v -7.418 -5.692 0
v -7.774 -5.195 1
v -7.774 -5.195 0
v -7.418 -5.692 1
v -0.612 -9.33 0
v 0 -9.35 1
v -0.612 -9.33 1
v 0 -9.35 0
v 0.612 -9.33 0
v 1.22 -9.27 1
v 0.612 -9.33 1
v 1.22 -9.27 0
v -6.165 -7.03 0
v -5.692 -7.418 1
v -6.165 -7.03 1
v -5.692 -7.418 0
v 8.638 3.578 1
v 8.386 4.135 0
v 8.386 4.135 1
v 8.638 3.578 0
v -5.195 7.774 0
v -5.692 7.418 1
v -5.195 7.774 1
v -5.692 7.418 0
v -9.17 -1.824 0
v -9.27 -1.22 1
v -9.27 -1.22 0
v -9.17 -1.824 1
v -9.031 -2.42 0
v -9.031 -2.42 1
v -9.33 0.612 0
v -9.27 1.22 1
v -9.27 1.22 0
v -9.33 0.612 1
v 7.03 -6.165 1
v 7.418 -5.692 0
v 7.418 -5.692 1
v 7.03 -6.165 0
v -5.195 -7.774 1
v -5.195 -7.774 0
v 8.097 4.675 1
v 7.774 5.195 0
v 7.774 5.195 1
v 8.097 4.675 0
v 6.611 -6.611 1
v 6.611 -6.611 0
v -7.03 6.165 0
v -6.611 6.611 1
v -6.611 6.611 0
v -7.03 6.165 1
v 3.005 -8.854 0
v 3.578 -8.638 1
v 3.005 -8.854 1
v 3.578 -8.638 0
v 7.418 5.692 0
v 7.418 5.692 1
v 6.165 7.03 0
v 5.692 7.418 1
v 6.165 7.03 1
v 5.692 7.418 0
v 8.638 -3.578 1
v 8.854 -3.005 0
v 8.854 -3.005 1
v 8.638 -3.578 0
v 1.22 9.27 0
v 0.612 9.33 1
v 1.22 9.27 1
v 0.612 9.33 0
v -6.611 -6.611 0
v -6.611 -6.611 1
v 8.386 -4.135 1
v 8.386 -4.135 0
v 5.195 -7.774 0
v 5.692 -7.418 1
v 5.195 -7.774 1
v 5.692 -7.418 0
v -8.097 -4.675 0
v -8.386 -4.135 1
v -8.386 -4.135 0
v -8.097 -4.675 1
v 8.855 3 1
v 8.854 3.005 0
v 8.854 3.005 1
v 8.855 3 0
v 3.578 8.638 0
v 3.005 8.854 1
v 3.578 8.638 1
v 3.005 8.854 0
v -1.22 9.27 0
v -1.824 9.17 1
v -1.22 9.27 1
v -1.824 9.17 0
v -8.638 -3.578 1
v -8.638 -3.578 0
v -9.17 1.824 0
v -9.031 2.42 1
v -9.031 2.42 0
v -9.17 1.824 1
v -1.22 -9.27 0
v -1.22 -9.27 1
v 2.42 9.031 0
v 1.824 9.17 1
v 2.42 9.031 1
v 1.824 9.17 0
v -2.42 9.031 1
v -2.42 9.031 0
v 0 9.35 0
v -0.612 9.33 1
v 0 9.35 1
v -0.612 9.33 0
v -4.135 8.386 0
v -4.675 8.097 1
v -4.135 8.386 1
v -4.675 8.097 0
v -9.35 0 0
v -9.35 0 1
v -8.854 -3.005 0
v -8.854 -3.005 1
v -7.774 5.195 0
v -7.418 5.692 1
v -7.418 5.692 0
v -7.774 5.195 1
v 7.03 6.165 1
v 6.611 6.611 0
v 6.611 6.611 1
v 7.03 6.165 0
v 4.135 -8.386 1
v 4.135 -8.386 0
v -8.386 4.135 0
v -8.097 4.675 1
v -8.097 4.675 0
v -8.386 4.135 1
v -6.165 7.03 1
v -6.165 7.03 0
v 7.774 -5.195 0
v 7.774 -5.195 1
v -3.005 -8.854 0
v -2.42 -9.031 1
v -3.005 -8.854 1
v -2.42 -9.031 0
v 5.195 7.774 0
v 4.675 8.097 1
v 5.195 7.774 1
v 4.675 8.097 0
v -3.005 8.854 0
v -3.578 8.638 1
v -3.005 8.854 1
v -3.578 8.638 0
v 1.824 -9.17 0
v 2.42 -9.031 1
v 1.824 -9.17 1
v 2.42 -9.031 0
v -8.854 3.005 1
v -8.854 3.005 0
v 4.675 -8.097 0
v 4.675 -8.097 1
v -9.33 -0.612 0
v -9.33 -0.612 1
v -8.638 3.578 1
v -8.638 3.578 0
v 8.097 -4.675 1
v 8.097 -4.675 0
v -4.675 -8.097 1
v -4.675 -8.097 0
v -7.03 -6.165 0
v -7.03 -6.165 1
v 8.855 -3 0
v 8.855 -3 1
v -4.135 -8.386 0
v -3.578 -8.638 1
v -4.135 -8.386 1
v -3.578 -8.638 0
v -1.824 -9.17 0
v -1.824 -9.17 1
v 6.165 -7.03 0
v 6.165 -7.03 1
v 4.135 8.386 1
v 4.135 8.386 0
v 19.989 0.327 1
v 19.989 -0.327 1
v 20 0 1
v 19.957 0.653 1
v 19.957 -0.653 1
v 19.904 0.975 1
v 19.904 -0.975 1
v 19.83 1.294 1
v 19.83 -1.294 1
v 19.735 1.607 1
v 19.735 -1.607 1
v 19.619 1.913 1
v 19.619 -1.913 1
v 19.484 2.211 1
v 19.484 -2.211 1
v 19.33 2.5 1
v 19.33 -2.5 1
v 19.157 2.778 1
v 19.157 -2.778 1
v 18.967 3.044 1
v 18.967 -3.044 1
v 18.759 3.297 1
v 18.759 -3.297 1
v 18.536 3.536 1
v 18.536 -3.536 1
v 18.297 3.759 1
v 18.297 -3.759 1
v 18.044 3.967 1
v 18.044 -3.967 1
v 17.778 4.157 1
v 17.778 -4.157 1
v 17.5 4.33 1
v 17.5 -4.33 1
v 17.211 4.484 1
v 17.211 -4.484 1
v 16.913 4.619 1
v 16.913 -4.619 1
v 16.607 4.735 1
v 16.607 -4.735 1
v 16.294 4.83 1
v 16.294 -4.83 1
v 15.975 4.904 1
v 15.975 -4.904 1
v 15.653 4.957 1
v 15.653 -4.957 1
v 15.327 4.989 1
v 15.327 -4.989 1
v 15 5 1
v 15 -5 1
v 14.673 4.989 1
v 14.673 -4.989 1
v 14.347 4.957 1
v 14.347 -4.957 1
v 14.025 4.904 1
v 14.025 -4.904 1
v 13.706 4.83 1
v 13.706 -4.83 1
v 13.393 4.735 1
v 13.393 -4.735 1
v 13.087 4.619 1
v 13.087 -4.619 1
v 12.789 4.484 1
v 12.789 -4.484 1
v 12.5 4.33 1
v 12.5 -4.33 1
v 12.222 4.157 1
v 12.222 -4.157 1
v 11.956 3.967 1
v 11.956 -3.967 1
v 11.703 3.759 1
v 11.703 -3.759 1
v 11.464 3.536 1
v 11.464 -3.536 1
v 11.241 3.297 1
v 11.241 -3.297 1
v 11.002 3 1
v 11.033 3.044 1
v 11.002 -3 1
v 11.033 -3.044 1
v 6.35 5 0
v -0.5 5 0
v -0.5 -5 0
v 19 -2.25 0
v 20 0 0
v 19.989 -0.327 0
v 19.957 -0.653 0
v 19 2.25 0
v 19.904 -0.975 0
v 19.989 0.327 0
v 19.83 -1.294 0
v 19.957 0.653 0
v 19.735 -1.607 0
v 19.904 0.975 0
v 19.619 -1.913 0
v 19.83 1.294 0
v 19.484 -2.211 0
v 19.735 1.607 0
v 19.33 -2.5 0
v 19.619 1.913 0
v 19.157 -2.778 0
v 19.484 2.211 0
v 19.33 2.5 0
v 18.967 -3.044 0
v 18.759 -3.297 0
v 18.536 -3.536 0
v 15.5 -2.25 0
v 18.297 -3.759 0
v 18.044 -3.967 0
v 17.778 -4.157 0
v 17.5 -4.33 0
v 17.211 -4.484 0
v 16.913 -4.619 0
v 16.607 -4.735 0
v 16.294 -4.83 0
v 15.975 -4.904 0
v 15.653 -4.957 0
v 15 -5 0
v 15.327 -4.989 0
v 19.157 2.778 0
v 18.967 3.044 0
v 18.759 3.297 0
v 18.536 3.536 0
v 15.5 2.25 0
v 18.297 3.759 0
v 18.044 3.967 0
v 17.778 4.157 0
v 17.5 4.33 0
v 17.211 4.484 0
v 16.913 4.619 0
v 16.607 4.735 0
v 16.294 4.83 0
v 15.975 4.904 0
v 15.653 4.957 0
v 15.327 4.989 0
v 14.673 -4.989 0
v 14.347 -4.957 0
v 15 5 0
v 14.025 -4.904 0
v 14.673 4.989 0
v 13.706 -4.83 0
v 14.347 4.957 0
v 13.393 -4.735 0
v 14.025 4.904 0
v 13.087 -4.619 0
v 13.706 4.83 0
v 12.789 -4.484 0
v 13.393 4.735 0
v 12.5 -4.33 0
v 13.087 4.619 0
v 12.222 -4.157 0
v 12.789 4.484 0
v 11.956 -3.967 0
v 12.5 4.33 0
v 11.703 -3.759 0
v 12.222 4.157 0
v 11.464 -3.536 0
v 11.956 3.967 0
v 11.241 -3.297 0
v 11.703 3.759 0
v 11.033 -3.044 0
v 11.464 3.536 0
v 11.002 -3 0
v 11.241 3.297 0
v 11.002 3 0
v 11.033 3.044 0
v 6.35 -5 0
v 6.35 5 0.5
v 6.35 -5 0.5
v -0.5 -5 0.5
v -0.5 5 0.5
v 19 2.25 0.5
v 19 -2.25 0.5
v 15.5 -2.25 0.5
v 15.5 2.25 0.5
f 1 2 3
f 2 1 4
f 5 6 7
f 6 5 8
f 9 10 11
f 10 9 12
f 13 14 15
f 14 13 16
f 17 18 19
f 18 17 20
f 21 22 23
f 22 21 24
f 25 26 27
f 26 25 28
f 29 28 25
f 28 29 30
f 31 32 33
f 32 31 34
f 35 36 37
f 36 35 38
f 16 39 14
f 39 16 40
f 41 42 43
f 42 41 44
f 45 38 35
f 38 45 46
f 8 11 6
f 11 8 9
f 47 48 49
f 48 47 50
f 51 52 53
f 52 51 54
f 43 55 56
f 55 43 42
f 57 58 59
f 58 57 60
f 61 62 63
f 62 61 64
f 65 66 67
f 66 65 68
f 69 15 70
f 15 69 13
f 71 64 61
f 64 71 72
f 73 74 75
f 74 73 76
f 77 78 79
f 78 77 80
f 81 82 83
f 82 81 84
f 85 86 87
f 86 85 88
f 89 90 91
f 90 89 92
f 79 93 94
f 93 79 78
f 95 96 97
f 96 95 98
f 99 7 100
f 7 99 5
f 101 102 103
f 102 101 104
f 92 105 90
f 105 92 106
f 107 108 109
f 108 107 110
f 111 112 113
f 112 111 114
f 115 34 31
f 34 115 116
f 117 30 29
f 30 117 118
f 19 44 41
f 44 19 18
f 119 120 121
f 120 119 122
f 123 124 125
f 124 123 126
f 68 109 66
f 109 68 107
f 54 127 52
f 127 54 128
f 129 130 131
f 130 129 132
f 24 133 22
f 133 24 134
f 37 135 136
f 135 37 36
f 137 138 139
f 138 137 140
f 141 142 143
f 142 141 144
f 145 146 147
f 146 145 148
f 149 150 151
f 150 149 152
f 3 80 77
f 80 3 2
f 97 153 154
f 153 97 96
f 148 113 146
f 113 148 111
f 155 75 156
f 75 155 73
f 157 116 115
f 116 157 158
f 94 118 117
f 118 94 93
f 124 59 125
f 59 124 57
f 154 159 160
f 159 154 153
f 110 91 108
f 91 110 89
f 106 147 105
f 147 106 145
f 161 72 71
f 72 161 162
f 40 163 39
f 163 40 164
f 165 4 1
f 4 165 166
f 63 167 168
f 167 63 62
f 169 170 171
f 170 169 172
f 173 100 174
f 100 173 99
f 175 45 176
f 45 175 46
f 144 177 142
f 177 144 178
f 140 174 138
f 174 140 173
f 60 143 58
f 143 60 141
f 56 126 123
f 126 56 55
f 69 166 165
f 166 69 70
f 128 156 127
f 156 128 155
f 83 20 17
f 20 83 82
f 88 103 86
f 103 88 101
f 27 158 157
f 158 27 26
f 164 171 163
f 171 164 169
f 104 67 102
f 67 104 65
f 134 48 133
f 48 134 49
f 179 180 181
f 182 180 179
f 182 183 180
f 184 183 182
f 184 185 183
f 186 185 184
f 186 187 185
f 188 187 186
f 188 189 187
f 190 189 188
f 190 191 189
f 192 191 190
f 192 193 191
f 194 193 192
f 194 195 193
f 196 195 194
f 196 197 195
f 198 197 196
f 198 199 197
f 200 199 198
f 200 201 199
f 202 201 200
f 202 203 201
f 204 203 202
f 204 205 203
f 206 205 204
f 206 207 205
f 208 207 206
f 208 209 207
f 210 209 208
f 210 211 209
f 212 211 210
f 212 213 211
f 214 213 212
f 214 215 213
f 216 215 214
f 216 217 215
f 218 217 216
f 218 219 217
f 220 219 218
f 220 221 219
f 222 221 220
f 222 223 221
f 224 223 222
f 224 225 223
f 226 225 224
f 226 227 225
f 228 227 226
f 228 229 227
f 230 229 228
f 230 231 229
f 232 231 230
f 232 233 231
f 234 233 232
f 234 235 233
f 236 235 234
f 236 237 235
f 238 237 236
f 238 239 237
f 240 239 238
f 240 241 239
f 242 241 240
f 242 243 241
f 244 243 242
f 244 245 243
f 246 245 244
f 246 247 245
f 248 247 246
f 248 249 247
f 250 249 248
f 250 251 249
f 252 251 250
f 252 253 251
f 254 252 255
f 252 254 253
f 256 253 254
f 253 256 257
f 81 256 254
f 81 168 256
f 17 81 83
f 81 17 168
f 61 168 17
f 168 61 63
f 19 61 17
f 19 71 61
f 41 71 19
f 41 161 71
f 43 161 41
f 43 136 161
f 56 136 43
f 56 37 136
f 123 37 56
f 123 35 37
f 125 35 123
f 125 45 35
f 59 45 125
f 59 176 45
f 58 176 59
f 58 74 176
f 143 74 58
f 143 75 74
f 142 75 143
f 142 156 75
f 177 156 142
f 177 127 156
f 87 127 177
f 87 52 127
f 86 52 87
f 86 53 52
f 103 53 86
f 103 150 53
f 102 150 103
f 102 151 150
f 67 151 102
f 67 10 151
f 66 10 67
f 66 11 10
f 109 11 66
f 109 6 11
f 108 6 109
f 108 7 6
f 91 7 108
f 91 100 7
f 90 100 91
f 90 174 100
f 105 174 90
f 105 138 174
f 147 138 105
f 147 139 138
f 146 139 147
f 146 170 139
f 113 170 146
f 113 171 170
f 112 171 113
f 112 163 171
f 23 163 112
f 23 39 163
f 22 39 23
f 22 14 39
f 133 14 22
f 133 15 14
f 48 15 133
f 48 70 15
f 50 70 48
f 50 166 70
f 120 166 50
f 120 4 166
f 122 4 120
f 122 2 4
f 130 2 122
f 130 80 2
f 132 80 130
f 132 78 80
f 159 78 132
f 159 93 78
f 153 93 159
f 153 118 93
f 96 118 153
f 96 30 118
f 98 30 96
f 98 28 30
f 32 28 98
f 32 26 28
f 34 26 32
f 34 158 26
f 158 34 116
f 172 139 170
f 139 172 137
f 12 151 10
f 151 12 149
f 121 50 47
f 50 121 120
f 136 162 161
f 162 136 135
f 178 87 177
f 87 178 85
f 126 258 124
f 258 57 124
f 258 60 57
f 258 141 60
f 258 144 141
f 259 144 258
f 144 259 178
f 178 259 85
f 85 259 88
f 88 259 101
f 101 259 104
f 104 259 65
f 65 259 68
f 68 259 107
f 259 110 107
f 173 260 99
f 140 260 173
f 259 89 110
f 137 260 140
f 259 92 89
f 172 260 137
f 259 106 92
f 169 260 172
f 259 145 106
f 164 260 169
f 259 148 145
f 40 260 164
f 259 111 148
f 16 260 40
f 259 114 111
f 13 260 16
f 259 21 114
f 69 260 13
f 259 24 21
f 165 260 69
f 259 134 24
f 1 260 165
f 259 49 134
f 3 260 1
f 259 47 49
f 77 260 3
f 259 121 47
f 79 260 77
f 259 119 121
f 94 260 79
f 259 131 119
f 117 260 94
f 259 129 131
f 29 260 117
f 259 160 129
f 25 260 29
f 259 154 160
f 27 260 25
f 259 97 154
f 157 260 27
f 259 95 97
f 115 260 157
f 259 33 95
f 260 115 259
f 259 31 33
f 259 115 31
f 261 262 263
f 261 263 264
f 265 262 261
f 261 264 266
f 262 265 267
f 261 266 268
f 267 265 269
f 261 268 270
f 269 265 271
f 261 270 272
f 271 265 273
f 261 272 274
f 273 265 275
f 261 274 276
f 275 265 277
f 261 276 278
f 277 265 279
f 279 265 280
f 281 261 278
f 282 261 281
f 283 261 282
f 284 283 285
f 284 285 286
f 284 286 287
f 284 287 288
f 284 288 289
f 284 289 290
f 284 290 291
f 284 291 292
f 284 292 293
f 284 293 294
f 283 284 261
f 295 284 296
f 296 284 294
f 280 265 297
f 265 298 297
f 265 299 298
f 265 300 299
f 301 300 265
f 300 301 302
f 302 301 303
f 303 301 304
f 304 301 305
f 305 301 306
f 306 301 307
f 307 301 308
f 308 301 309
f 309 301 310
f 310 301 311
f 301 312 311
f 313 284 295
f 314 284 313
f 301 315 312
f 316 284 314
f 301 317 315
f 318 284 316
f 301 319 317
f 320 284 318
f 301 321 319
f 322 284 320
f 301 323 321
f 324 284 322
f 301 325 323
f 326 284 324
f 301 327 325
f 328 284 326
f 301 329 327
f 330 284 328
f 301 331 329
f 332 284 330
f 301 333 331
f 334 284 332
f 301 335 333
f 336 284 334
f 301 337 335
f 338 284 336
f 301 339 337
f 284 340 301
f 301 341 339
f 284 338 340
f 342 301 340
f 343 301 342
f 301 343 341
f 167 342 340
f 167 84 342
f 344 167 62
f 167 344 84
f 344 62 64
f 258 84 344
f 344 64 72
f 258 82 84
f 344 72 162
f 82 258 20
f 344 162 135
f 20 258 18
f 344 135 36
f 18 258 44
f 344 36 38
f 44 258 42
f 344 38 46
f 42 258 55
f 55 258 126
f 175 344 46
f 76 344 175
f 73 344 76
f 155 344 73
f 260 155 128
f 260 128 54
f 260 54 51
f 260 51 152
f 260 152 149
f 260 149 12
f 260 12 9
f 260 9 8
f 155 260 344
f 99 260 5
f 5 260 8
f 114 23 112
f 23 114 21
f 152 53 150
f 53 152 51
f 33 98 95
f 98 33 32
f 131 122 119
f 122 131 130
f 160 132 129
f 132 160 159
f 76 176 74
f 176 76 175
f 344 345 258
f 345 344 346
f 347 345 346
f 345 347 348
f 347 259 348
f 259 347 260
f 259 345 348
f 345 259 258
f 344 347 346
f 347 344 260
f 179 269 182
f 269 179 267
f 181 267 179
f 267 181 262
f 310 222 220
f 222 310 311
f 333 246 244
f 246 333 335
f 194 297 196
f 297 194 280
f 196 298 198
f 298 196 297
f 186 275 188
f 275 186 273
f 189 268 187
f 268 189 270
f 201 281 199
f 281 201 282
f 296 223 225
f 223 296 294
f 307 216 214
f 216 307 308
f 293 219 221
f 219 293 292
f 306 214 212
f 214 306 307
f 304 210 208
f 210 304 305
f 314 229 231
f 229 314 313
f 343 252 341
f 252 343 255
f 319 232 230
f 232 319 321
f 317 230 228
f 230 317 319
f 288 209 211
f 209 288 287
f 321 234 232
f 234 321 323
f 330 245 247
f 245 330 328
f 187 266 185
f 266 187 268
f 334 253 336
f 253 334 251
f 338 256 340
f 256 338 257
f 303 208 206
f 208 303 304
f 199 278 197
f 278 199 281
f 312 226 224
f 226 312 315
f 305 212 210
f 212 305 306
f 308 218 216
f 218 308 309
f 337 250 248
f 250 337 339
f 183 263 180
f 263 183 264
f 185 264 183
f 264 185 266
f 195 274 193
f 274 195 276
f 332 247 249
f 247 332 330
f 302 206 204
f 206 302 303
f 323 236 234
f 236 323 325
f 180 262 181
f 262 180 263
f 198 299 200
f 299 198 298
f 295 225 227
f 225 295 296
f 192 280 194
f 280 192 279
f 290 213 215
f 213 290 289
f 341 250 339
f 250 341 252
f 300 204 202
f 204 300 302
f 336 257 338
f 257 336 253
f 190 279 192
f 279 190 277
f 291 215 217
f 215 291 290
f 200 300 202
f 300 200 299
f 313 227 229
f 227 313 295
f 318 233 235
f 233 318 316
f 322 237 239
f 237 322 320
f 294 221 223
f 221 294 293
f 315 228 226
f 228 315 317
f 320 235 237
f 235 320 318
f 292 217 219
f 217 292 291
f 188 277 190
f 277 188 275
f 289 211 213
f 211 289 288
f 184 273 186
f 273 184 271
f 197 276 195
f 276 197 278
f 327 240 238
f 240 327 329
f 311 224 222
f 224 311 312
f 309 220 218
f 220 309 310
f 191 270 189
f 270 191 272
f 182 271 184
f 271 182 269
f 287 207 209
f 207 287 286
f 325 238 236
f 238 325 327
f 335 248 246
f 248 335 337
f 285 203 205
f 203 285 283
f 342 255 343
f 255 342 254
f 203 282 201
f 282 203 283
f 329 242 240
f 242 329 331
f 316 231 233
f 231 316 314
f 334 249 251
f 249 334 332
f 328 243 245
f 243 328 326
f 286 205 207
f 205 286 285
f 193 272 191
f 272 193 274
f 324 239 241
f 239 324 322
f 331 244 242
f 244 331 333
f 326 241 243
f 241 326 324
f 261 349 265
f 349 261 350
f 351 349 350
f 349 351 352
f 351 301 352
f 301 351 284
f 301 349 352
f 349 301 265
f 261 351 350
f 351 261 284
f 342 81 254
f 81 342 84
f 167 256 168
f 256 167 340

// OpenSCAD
// Snap-on clip that holds a piece of tubing next to a 12.7 mm (1/2 inch) lab stand rod.
// Printed flat: a 10 mm tall extrusion (Z) of a 2-D profile in the XY plane.
//
// Profile (in XY):
//   1) Rod ring: 12.7 mm inner diameter, 3 mm wall (18.7 mm outer diameter), centred at origin.
//      Opening cut out of the -X side: everything with x < 0 and -5 < y < 5 is removed.
//   2) Tubing ring: 6 mm inner diameter, 2 mm wall, centred at x = 15, y = 0.
//      Opening cut out of the +X side: x > 15 and -2.25 < y < 2.25.
//   3) Solid bridge: 6 mm wide (Y) between x = 8 and x = 12, joining the two rings without blocking either hole.

// ---------------- Parameters ----------------
rod_id        = 12.7;   // stand rod inner diameter (1/2 inch)
rod_wall      = 3;      // stand rod ring wall thickness
ring_open     = 10;     // width of opening cut from the -X side of the rod ring

tube_id       = 6;      // tubing inner diameter
tube_wall     = 2;      // tubing ring wall thickness
tube_x        = 15;     // tubing ring centre X position
tube_open     = 4.5;    // width of opening cut from the +X side of the tubing ring

bridge_x1     = 8;      // bridge start X position
bridge_x2     = 12;     // bridge end X position
bridge_w      = 6;      // bridge width along Y

eps           = 0.5;    // cutter overshoot past faces
$fn           = 96;     // curve resolution

// ---------------- Derived ----------------
rod_od    = rod_id + 2 * rod_wall;   // 18.7 mm outer diameter of rod ring
tube_od   = tube_id + 2 * tube_wall; // 10 mm outer diameter of tubing ring

// ---------------- Profile (in XY) ----------------
module rod_ring() {
    difference() {
        translate([0, 0])
            cylinder(d = rod_od, h = 1);
        // Opening: everything with x < 0 and -5 < y < 5
        translate([-eps, -ring_open / 2, -eps])
            cube([eps + rod_id / 2, ring_open, 2 * eps]);
    }
}

module tube_ring() {
    difference() {
        translate([tube_x, 0])
            cylinder(d = tube_od, h = 1);
        // Opening: x > 15 and -2.25 < y < 2.25
        translate([tube_x + eps, -tube_open / 2, -eps])
            cube([eps + tube_id / 2, tube_open, 2 * eps]);
    }
}

module bridge() {
    // Solid block between x = 8 and x = 12, 6 mm wide in Y, 1 mm tall
    translate([bridge_x1, -bridge_w / 2, 0])
        cube([bridge_x2 - bridge_x1, bridge_w, 1]);
}

// ---------------- Assembly ----------------
union() {
    rod_ring();
    tube_ring();
    bridge();
}
